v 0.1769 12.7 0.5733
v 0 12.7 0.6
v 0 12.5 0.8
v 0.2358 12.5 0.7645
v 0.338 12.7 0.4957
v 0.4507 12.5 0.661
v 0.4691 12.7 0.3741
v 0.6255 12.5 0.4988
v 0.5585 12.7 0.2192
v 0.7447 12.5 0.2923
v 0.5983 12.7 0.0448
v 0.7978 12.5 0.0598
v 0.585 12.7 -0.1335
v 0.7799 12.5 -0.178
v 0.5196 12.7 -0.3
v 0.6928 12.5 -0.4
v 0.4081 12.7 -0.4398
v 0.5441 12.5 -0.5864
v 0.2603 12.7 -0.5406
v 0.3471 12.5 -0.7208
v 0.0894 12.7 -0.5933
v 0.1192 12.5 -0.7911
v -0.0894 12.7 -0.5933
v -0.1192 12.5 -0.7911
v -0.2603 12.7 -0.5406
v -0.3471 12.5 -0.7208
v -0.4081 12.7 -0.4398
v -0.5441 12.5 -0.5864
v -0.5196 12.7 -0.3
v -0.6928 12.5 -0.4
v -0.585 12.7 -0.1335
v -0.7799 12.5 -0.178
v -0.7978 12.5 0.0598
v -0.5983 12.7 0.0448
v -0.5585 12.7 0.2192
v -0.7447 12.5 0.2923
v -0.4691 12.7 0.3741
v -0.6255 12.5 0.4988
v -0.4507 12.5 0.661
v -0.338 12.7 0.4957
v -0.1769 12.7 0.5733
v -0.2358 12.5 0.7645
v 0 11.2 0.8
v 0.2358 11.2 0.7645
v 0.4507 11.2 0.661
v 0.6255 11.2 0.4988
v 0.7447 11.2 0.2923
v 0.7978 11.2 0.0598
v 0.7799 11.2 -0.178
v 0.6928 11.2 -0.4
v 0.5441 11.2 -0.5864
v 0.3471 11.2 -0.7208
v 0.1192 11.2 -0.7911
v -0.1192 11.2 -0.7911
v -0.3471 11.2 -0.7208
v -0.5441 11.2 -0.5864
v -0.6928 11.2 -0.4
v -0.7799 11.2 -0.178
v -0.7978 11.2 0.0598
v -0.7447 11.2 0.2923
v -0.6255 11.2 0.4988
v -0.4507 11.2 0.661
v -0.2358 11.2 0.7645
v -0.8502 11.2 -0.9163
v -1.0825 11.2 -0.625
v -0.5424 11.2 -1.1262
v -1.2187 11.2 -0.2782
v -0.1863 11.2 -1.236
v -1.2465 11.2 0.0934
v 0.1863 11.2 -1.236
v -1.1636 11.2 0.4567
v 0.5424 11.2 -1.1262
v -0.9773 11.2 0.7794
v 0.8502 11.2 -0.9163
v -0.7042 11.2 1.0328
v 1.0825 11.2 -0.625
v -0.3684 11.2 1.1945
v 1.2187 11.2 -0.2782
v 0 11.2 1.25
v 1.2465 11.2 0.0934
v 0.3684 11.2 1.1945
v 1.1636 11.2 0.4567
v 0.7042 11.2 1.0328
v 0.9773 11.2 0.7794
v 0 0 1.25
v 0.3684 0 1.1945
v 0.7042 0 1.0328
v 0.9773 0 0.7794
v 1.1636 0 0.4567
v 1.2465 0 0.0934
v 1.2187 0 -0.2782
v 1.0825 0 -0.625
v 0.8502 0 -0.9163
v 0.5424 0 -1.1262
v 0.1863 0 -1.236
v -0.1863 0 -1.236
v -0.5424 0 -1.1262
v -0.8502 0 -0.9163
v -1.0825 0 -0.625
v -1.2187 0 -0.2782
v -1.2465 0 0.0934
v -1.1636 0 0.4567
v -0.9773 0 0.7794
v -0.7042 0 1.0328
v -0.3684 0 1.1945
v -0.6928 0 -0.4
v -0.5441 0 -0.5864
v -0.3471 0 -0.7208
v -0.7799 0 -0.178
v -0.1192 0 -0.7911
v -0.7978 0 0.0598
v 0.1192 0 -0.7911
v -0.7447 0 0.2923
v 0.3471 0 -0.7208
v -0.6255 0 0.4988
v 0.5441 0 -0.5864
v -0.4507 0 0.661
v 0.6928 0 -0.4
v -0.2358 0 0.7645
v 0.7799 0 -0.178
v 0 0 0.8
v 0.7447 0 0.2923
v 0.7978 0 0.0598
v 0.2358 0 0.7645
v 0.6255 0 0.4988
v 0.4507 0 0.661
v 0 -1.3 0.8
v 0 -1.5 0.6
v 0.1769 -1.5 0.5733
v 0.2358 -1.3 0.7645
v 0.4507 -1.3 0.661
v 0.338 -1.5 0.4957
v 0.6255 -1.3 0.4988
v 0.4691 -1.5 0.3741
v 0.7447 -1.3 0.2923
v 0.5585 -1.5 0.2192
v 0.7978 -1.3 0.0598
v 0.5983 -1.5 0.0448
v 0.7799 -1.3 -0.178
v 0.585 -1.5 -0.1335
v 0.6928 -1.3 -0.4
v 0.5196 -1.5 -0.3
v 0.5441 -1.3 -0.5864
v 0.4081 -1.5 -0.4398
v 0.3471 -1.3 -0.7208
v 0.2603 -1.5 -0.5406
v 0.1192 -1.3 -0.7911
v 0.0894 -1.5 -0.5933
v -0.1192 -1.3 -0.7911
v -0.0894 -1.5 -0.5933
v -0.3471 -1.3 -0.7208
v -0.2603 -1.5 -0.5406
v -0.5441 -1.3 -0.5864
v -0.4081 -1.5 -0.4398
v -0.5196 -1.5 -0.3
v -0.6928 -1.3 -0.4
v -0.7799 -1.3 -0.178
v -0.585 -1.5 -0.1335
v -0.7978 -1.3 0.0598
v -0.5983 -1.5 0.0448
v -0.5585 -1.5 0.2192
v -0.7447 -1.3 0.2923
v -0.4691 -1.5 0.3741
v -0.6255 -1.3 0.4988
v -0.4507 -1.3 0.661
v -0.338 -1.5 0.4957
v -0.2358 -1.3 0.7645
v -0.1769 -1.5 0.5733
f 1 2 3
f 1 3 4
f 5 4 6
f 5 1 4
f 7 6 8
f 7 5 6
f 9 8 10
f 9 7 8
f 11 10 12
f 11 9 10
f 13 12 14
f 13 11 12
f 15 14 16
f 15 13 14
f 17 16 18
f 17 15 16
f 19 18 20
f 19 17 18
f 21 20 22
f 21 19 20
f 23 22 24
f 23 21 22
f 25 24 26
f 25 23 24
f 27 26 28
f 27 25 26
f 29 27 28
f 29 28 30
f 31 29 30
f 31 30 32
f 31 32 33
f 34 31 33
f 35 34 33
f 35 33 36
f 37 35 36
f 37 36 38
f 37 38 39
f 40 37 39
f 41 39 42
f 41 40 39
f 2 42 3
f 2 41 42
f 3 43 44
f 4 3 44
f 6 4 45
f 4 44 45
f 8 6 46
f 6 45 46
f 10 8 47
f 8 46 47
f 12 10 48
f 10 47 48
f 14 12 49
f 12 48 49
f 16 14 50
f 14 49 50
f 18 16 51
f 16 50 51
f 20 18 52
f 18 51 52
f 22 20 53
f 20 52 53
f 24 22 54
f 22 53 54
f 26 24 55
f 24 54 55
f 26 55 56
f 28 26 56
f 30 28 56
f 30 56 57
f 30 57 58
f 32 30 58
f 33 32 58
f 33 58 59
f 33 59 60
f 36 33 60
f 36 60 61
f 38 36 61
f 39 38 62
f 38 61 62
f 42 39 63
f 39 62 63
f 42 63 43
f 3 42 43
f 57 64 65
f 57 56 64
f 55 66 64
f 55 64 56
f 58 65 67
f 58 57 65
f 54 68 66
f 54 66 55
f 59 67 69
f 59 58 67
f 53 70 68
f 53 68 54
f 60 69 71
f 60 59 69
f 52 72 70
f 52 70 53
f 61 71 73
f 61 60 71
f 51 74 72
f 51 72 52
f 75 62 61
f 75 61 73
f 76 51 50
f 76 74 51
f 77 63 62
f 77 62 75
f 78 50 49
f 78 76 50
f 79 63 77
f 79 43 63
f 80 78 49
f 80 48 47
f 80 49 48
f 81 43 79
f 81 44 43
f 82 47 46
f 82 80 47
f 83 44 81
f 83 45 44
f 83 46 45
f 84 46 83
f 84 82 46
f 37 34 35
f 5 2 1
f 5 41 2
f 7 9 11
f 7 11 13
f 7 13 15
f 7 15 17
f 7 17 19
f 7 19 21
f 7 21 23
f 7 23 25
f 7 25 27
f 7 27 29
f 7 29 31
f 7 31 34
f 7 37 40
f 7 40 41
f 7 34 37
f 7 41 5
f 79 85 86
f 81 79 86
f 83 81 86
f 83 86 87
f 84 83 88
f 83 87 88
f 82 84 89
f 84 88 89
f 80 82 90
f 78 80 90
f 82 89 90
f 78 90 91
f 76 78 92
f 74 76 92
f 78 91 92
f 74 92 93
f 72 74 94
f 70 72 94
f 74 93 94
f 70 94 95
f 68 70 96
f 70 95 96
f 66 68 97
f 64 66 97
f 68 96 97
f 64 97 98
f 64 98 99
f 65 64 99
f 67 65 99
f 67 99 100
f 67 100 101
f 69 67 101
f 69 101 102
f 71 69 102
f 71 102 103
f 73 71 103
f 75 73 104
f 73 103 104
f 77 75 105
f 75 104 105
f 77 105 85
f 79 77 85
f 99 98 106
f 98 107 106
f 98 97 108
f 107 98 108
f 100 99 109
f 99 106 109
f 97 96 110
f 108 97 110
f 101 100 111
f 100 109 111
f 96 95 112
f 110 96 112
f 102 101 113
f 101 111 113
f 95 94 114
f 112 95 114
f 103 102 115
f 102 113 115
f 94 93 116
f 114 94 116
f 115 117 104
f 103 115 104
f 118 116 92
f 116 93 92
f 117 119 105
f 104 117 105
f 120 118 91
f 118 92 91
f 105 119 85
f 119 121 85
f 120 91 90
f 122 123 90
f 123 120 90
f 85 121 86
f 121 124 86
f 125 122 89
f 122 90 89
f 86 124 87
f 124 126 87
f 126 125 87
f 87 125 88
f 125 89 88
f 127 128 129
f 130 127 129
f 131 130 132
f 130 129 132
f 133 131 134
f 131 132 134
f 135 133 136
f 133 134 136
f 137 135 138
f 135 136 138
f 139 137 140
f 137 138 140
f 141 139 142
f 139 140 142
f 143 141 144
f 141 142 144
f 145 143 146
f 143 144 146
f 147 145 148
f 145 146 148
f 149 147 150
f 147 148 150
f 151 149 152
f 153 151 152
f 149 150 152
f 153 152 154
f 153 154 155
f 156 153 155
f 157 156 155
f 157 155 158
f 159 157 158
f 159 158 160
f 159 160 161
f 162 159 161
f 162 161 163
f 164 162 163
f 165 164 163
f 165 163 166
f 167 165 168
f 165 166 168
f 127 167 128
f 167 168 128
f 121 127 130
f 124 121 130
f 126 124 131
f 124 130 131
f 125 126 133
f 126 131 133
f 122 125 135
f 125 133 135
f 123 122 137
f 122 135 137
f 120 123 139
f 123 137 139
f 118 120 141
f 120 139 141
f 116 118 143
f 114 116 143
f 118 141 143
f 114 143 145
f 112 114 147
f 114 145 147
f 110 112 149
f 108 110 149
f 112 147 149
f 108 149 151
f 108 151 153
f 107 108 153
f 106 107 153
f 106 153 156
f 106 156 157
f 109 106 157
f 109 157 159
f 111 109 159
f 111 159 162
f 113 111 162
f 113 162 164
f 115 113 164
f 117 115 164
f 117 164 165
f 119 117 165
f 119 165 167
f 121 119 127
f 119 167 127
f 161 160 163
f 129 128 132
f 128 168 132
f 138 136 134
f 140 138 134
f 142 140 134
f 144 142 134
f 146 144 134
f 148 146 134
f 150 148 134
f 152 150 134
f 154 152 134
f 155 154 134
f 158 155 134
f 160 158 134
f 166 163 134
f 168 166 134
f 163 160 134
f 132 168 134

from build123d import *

# Parameters (mm, degrees)
SKETCH1_R           = 1.25
BOSS_EXTRUDE1_DEPTH = 11.2
SKETCH2_R           = 0.8
BOSS_EXTRUDE2_DEPTH = 1.5
BOSS_EXTRUDE3_START = -12.7
SKETCH2_2_R         = 0.8
BOSS_EXTRUDE3_DEPTH = 1.5
CHAMFER1_SIZE       = 0.2


with BuildPart() as part:
    # Sketch1 → Boss-Extrude1 (new body)
    with BuildSketch(Plane(origin=(0, 0, 0), x_dir=(1, 0, 0), z_dir=(0, 1, 0))):
        with Locations(Location((0, 0, 0), (0, 0, 270))):
            Circle(SKETCH1_R)
    extrude(amount=BOSS_EXTRUDE1_DEPTH)

    # Sketch2 → Boss-Extrude2 (add)
    with BuildSketch(Plane(origin=(0, 11.2, 0), x_dir=(1, 0, 0), z_dir=(0, 1, 0))):
        with Locations(Location((0, 0, 0), (0, 0, 270))):
            Circle(SKETCH2_R)
    extrude(amount=BOSS_EXTRUDE2_DEPTH)

    # Sketch2<2> → Boss-Extrude3 (add)
    with BuildSketch(Plane(origin=(0, 11.2, 0), x_dir=(1, 0, 0), z_dir=(0, 1, 0)).offset(BOSS_EXTRUDE3_START)):
        with Locations(Location((0, 0, 0), (0, 0, 270))):
            Circle(SKETCH2_2_R)
    extrude(amount=BOSS_EXTRUDE3_DEPTH)

    # Chamfer1
    chamfer1_edges = [part.edges().sort_by_distance(p)[0] for p in [
        (0, -1.5, -0.8),
        (0, 12.7, -0.8),
    ]]
    chamfer(chamfer1_edges, length=CHAMFER1_SIZE)


solid = part.part
